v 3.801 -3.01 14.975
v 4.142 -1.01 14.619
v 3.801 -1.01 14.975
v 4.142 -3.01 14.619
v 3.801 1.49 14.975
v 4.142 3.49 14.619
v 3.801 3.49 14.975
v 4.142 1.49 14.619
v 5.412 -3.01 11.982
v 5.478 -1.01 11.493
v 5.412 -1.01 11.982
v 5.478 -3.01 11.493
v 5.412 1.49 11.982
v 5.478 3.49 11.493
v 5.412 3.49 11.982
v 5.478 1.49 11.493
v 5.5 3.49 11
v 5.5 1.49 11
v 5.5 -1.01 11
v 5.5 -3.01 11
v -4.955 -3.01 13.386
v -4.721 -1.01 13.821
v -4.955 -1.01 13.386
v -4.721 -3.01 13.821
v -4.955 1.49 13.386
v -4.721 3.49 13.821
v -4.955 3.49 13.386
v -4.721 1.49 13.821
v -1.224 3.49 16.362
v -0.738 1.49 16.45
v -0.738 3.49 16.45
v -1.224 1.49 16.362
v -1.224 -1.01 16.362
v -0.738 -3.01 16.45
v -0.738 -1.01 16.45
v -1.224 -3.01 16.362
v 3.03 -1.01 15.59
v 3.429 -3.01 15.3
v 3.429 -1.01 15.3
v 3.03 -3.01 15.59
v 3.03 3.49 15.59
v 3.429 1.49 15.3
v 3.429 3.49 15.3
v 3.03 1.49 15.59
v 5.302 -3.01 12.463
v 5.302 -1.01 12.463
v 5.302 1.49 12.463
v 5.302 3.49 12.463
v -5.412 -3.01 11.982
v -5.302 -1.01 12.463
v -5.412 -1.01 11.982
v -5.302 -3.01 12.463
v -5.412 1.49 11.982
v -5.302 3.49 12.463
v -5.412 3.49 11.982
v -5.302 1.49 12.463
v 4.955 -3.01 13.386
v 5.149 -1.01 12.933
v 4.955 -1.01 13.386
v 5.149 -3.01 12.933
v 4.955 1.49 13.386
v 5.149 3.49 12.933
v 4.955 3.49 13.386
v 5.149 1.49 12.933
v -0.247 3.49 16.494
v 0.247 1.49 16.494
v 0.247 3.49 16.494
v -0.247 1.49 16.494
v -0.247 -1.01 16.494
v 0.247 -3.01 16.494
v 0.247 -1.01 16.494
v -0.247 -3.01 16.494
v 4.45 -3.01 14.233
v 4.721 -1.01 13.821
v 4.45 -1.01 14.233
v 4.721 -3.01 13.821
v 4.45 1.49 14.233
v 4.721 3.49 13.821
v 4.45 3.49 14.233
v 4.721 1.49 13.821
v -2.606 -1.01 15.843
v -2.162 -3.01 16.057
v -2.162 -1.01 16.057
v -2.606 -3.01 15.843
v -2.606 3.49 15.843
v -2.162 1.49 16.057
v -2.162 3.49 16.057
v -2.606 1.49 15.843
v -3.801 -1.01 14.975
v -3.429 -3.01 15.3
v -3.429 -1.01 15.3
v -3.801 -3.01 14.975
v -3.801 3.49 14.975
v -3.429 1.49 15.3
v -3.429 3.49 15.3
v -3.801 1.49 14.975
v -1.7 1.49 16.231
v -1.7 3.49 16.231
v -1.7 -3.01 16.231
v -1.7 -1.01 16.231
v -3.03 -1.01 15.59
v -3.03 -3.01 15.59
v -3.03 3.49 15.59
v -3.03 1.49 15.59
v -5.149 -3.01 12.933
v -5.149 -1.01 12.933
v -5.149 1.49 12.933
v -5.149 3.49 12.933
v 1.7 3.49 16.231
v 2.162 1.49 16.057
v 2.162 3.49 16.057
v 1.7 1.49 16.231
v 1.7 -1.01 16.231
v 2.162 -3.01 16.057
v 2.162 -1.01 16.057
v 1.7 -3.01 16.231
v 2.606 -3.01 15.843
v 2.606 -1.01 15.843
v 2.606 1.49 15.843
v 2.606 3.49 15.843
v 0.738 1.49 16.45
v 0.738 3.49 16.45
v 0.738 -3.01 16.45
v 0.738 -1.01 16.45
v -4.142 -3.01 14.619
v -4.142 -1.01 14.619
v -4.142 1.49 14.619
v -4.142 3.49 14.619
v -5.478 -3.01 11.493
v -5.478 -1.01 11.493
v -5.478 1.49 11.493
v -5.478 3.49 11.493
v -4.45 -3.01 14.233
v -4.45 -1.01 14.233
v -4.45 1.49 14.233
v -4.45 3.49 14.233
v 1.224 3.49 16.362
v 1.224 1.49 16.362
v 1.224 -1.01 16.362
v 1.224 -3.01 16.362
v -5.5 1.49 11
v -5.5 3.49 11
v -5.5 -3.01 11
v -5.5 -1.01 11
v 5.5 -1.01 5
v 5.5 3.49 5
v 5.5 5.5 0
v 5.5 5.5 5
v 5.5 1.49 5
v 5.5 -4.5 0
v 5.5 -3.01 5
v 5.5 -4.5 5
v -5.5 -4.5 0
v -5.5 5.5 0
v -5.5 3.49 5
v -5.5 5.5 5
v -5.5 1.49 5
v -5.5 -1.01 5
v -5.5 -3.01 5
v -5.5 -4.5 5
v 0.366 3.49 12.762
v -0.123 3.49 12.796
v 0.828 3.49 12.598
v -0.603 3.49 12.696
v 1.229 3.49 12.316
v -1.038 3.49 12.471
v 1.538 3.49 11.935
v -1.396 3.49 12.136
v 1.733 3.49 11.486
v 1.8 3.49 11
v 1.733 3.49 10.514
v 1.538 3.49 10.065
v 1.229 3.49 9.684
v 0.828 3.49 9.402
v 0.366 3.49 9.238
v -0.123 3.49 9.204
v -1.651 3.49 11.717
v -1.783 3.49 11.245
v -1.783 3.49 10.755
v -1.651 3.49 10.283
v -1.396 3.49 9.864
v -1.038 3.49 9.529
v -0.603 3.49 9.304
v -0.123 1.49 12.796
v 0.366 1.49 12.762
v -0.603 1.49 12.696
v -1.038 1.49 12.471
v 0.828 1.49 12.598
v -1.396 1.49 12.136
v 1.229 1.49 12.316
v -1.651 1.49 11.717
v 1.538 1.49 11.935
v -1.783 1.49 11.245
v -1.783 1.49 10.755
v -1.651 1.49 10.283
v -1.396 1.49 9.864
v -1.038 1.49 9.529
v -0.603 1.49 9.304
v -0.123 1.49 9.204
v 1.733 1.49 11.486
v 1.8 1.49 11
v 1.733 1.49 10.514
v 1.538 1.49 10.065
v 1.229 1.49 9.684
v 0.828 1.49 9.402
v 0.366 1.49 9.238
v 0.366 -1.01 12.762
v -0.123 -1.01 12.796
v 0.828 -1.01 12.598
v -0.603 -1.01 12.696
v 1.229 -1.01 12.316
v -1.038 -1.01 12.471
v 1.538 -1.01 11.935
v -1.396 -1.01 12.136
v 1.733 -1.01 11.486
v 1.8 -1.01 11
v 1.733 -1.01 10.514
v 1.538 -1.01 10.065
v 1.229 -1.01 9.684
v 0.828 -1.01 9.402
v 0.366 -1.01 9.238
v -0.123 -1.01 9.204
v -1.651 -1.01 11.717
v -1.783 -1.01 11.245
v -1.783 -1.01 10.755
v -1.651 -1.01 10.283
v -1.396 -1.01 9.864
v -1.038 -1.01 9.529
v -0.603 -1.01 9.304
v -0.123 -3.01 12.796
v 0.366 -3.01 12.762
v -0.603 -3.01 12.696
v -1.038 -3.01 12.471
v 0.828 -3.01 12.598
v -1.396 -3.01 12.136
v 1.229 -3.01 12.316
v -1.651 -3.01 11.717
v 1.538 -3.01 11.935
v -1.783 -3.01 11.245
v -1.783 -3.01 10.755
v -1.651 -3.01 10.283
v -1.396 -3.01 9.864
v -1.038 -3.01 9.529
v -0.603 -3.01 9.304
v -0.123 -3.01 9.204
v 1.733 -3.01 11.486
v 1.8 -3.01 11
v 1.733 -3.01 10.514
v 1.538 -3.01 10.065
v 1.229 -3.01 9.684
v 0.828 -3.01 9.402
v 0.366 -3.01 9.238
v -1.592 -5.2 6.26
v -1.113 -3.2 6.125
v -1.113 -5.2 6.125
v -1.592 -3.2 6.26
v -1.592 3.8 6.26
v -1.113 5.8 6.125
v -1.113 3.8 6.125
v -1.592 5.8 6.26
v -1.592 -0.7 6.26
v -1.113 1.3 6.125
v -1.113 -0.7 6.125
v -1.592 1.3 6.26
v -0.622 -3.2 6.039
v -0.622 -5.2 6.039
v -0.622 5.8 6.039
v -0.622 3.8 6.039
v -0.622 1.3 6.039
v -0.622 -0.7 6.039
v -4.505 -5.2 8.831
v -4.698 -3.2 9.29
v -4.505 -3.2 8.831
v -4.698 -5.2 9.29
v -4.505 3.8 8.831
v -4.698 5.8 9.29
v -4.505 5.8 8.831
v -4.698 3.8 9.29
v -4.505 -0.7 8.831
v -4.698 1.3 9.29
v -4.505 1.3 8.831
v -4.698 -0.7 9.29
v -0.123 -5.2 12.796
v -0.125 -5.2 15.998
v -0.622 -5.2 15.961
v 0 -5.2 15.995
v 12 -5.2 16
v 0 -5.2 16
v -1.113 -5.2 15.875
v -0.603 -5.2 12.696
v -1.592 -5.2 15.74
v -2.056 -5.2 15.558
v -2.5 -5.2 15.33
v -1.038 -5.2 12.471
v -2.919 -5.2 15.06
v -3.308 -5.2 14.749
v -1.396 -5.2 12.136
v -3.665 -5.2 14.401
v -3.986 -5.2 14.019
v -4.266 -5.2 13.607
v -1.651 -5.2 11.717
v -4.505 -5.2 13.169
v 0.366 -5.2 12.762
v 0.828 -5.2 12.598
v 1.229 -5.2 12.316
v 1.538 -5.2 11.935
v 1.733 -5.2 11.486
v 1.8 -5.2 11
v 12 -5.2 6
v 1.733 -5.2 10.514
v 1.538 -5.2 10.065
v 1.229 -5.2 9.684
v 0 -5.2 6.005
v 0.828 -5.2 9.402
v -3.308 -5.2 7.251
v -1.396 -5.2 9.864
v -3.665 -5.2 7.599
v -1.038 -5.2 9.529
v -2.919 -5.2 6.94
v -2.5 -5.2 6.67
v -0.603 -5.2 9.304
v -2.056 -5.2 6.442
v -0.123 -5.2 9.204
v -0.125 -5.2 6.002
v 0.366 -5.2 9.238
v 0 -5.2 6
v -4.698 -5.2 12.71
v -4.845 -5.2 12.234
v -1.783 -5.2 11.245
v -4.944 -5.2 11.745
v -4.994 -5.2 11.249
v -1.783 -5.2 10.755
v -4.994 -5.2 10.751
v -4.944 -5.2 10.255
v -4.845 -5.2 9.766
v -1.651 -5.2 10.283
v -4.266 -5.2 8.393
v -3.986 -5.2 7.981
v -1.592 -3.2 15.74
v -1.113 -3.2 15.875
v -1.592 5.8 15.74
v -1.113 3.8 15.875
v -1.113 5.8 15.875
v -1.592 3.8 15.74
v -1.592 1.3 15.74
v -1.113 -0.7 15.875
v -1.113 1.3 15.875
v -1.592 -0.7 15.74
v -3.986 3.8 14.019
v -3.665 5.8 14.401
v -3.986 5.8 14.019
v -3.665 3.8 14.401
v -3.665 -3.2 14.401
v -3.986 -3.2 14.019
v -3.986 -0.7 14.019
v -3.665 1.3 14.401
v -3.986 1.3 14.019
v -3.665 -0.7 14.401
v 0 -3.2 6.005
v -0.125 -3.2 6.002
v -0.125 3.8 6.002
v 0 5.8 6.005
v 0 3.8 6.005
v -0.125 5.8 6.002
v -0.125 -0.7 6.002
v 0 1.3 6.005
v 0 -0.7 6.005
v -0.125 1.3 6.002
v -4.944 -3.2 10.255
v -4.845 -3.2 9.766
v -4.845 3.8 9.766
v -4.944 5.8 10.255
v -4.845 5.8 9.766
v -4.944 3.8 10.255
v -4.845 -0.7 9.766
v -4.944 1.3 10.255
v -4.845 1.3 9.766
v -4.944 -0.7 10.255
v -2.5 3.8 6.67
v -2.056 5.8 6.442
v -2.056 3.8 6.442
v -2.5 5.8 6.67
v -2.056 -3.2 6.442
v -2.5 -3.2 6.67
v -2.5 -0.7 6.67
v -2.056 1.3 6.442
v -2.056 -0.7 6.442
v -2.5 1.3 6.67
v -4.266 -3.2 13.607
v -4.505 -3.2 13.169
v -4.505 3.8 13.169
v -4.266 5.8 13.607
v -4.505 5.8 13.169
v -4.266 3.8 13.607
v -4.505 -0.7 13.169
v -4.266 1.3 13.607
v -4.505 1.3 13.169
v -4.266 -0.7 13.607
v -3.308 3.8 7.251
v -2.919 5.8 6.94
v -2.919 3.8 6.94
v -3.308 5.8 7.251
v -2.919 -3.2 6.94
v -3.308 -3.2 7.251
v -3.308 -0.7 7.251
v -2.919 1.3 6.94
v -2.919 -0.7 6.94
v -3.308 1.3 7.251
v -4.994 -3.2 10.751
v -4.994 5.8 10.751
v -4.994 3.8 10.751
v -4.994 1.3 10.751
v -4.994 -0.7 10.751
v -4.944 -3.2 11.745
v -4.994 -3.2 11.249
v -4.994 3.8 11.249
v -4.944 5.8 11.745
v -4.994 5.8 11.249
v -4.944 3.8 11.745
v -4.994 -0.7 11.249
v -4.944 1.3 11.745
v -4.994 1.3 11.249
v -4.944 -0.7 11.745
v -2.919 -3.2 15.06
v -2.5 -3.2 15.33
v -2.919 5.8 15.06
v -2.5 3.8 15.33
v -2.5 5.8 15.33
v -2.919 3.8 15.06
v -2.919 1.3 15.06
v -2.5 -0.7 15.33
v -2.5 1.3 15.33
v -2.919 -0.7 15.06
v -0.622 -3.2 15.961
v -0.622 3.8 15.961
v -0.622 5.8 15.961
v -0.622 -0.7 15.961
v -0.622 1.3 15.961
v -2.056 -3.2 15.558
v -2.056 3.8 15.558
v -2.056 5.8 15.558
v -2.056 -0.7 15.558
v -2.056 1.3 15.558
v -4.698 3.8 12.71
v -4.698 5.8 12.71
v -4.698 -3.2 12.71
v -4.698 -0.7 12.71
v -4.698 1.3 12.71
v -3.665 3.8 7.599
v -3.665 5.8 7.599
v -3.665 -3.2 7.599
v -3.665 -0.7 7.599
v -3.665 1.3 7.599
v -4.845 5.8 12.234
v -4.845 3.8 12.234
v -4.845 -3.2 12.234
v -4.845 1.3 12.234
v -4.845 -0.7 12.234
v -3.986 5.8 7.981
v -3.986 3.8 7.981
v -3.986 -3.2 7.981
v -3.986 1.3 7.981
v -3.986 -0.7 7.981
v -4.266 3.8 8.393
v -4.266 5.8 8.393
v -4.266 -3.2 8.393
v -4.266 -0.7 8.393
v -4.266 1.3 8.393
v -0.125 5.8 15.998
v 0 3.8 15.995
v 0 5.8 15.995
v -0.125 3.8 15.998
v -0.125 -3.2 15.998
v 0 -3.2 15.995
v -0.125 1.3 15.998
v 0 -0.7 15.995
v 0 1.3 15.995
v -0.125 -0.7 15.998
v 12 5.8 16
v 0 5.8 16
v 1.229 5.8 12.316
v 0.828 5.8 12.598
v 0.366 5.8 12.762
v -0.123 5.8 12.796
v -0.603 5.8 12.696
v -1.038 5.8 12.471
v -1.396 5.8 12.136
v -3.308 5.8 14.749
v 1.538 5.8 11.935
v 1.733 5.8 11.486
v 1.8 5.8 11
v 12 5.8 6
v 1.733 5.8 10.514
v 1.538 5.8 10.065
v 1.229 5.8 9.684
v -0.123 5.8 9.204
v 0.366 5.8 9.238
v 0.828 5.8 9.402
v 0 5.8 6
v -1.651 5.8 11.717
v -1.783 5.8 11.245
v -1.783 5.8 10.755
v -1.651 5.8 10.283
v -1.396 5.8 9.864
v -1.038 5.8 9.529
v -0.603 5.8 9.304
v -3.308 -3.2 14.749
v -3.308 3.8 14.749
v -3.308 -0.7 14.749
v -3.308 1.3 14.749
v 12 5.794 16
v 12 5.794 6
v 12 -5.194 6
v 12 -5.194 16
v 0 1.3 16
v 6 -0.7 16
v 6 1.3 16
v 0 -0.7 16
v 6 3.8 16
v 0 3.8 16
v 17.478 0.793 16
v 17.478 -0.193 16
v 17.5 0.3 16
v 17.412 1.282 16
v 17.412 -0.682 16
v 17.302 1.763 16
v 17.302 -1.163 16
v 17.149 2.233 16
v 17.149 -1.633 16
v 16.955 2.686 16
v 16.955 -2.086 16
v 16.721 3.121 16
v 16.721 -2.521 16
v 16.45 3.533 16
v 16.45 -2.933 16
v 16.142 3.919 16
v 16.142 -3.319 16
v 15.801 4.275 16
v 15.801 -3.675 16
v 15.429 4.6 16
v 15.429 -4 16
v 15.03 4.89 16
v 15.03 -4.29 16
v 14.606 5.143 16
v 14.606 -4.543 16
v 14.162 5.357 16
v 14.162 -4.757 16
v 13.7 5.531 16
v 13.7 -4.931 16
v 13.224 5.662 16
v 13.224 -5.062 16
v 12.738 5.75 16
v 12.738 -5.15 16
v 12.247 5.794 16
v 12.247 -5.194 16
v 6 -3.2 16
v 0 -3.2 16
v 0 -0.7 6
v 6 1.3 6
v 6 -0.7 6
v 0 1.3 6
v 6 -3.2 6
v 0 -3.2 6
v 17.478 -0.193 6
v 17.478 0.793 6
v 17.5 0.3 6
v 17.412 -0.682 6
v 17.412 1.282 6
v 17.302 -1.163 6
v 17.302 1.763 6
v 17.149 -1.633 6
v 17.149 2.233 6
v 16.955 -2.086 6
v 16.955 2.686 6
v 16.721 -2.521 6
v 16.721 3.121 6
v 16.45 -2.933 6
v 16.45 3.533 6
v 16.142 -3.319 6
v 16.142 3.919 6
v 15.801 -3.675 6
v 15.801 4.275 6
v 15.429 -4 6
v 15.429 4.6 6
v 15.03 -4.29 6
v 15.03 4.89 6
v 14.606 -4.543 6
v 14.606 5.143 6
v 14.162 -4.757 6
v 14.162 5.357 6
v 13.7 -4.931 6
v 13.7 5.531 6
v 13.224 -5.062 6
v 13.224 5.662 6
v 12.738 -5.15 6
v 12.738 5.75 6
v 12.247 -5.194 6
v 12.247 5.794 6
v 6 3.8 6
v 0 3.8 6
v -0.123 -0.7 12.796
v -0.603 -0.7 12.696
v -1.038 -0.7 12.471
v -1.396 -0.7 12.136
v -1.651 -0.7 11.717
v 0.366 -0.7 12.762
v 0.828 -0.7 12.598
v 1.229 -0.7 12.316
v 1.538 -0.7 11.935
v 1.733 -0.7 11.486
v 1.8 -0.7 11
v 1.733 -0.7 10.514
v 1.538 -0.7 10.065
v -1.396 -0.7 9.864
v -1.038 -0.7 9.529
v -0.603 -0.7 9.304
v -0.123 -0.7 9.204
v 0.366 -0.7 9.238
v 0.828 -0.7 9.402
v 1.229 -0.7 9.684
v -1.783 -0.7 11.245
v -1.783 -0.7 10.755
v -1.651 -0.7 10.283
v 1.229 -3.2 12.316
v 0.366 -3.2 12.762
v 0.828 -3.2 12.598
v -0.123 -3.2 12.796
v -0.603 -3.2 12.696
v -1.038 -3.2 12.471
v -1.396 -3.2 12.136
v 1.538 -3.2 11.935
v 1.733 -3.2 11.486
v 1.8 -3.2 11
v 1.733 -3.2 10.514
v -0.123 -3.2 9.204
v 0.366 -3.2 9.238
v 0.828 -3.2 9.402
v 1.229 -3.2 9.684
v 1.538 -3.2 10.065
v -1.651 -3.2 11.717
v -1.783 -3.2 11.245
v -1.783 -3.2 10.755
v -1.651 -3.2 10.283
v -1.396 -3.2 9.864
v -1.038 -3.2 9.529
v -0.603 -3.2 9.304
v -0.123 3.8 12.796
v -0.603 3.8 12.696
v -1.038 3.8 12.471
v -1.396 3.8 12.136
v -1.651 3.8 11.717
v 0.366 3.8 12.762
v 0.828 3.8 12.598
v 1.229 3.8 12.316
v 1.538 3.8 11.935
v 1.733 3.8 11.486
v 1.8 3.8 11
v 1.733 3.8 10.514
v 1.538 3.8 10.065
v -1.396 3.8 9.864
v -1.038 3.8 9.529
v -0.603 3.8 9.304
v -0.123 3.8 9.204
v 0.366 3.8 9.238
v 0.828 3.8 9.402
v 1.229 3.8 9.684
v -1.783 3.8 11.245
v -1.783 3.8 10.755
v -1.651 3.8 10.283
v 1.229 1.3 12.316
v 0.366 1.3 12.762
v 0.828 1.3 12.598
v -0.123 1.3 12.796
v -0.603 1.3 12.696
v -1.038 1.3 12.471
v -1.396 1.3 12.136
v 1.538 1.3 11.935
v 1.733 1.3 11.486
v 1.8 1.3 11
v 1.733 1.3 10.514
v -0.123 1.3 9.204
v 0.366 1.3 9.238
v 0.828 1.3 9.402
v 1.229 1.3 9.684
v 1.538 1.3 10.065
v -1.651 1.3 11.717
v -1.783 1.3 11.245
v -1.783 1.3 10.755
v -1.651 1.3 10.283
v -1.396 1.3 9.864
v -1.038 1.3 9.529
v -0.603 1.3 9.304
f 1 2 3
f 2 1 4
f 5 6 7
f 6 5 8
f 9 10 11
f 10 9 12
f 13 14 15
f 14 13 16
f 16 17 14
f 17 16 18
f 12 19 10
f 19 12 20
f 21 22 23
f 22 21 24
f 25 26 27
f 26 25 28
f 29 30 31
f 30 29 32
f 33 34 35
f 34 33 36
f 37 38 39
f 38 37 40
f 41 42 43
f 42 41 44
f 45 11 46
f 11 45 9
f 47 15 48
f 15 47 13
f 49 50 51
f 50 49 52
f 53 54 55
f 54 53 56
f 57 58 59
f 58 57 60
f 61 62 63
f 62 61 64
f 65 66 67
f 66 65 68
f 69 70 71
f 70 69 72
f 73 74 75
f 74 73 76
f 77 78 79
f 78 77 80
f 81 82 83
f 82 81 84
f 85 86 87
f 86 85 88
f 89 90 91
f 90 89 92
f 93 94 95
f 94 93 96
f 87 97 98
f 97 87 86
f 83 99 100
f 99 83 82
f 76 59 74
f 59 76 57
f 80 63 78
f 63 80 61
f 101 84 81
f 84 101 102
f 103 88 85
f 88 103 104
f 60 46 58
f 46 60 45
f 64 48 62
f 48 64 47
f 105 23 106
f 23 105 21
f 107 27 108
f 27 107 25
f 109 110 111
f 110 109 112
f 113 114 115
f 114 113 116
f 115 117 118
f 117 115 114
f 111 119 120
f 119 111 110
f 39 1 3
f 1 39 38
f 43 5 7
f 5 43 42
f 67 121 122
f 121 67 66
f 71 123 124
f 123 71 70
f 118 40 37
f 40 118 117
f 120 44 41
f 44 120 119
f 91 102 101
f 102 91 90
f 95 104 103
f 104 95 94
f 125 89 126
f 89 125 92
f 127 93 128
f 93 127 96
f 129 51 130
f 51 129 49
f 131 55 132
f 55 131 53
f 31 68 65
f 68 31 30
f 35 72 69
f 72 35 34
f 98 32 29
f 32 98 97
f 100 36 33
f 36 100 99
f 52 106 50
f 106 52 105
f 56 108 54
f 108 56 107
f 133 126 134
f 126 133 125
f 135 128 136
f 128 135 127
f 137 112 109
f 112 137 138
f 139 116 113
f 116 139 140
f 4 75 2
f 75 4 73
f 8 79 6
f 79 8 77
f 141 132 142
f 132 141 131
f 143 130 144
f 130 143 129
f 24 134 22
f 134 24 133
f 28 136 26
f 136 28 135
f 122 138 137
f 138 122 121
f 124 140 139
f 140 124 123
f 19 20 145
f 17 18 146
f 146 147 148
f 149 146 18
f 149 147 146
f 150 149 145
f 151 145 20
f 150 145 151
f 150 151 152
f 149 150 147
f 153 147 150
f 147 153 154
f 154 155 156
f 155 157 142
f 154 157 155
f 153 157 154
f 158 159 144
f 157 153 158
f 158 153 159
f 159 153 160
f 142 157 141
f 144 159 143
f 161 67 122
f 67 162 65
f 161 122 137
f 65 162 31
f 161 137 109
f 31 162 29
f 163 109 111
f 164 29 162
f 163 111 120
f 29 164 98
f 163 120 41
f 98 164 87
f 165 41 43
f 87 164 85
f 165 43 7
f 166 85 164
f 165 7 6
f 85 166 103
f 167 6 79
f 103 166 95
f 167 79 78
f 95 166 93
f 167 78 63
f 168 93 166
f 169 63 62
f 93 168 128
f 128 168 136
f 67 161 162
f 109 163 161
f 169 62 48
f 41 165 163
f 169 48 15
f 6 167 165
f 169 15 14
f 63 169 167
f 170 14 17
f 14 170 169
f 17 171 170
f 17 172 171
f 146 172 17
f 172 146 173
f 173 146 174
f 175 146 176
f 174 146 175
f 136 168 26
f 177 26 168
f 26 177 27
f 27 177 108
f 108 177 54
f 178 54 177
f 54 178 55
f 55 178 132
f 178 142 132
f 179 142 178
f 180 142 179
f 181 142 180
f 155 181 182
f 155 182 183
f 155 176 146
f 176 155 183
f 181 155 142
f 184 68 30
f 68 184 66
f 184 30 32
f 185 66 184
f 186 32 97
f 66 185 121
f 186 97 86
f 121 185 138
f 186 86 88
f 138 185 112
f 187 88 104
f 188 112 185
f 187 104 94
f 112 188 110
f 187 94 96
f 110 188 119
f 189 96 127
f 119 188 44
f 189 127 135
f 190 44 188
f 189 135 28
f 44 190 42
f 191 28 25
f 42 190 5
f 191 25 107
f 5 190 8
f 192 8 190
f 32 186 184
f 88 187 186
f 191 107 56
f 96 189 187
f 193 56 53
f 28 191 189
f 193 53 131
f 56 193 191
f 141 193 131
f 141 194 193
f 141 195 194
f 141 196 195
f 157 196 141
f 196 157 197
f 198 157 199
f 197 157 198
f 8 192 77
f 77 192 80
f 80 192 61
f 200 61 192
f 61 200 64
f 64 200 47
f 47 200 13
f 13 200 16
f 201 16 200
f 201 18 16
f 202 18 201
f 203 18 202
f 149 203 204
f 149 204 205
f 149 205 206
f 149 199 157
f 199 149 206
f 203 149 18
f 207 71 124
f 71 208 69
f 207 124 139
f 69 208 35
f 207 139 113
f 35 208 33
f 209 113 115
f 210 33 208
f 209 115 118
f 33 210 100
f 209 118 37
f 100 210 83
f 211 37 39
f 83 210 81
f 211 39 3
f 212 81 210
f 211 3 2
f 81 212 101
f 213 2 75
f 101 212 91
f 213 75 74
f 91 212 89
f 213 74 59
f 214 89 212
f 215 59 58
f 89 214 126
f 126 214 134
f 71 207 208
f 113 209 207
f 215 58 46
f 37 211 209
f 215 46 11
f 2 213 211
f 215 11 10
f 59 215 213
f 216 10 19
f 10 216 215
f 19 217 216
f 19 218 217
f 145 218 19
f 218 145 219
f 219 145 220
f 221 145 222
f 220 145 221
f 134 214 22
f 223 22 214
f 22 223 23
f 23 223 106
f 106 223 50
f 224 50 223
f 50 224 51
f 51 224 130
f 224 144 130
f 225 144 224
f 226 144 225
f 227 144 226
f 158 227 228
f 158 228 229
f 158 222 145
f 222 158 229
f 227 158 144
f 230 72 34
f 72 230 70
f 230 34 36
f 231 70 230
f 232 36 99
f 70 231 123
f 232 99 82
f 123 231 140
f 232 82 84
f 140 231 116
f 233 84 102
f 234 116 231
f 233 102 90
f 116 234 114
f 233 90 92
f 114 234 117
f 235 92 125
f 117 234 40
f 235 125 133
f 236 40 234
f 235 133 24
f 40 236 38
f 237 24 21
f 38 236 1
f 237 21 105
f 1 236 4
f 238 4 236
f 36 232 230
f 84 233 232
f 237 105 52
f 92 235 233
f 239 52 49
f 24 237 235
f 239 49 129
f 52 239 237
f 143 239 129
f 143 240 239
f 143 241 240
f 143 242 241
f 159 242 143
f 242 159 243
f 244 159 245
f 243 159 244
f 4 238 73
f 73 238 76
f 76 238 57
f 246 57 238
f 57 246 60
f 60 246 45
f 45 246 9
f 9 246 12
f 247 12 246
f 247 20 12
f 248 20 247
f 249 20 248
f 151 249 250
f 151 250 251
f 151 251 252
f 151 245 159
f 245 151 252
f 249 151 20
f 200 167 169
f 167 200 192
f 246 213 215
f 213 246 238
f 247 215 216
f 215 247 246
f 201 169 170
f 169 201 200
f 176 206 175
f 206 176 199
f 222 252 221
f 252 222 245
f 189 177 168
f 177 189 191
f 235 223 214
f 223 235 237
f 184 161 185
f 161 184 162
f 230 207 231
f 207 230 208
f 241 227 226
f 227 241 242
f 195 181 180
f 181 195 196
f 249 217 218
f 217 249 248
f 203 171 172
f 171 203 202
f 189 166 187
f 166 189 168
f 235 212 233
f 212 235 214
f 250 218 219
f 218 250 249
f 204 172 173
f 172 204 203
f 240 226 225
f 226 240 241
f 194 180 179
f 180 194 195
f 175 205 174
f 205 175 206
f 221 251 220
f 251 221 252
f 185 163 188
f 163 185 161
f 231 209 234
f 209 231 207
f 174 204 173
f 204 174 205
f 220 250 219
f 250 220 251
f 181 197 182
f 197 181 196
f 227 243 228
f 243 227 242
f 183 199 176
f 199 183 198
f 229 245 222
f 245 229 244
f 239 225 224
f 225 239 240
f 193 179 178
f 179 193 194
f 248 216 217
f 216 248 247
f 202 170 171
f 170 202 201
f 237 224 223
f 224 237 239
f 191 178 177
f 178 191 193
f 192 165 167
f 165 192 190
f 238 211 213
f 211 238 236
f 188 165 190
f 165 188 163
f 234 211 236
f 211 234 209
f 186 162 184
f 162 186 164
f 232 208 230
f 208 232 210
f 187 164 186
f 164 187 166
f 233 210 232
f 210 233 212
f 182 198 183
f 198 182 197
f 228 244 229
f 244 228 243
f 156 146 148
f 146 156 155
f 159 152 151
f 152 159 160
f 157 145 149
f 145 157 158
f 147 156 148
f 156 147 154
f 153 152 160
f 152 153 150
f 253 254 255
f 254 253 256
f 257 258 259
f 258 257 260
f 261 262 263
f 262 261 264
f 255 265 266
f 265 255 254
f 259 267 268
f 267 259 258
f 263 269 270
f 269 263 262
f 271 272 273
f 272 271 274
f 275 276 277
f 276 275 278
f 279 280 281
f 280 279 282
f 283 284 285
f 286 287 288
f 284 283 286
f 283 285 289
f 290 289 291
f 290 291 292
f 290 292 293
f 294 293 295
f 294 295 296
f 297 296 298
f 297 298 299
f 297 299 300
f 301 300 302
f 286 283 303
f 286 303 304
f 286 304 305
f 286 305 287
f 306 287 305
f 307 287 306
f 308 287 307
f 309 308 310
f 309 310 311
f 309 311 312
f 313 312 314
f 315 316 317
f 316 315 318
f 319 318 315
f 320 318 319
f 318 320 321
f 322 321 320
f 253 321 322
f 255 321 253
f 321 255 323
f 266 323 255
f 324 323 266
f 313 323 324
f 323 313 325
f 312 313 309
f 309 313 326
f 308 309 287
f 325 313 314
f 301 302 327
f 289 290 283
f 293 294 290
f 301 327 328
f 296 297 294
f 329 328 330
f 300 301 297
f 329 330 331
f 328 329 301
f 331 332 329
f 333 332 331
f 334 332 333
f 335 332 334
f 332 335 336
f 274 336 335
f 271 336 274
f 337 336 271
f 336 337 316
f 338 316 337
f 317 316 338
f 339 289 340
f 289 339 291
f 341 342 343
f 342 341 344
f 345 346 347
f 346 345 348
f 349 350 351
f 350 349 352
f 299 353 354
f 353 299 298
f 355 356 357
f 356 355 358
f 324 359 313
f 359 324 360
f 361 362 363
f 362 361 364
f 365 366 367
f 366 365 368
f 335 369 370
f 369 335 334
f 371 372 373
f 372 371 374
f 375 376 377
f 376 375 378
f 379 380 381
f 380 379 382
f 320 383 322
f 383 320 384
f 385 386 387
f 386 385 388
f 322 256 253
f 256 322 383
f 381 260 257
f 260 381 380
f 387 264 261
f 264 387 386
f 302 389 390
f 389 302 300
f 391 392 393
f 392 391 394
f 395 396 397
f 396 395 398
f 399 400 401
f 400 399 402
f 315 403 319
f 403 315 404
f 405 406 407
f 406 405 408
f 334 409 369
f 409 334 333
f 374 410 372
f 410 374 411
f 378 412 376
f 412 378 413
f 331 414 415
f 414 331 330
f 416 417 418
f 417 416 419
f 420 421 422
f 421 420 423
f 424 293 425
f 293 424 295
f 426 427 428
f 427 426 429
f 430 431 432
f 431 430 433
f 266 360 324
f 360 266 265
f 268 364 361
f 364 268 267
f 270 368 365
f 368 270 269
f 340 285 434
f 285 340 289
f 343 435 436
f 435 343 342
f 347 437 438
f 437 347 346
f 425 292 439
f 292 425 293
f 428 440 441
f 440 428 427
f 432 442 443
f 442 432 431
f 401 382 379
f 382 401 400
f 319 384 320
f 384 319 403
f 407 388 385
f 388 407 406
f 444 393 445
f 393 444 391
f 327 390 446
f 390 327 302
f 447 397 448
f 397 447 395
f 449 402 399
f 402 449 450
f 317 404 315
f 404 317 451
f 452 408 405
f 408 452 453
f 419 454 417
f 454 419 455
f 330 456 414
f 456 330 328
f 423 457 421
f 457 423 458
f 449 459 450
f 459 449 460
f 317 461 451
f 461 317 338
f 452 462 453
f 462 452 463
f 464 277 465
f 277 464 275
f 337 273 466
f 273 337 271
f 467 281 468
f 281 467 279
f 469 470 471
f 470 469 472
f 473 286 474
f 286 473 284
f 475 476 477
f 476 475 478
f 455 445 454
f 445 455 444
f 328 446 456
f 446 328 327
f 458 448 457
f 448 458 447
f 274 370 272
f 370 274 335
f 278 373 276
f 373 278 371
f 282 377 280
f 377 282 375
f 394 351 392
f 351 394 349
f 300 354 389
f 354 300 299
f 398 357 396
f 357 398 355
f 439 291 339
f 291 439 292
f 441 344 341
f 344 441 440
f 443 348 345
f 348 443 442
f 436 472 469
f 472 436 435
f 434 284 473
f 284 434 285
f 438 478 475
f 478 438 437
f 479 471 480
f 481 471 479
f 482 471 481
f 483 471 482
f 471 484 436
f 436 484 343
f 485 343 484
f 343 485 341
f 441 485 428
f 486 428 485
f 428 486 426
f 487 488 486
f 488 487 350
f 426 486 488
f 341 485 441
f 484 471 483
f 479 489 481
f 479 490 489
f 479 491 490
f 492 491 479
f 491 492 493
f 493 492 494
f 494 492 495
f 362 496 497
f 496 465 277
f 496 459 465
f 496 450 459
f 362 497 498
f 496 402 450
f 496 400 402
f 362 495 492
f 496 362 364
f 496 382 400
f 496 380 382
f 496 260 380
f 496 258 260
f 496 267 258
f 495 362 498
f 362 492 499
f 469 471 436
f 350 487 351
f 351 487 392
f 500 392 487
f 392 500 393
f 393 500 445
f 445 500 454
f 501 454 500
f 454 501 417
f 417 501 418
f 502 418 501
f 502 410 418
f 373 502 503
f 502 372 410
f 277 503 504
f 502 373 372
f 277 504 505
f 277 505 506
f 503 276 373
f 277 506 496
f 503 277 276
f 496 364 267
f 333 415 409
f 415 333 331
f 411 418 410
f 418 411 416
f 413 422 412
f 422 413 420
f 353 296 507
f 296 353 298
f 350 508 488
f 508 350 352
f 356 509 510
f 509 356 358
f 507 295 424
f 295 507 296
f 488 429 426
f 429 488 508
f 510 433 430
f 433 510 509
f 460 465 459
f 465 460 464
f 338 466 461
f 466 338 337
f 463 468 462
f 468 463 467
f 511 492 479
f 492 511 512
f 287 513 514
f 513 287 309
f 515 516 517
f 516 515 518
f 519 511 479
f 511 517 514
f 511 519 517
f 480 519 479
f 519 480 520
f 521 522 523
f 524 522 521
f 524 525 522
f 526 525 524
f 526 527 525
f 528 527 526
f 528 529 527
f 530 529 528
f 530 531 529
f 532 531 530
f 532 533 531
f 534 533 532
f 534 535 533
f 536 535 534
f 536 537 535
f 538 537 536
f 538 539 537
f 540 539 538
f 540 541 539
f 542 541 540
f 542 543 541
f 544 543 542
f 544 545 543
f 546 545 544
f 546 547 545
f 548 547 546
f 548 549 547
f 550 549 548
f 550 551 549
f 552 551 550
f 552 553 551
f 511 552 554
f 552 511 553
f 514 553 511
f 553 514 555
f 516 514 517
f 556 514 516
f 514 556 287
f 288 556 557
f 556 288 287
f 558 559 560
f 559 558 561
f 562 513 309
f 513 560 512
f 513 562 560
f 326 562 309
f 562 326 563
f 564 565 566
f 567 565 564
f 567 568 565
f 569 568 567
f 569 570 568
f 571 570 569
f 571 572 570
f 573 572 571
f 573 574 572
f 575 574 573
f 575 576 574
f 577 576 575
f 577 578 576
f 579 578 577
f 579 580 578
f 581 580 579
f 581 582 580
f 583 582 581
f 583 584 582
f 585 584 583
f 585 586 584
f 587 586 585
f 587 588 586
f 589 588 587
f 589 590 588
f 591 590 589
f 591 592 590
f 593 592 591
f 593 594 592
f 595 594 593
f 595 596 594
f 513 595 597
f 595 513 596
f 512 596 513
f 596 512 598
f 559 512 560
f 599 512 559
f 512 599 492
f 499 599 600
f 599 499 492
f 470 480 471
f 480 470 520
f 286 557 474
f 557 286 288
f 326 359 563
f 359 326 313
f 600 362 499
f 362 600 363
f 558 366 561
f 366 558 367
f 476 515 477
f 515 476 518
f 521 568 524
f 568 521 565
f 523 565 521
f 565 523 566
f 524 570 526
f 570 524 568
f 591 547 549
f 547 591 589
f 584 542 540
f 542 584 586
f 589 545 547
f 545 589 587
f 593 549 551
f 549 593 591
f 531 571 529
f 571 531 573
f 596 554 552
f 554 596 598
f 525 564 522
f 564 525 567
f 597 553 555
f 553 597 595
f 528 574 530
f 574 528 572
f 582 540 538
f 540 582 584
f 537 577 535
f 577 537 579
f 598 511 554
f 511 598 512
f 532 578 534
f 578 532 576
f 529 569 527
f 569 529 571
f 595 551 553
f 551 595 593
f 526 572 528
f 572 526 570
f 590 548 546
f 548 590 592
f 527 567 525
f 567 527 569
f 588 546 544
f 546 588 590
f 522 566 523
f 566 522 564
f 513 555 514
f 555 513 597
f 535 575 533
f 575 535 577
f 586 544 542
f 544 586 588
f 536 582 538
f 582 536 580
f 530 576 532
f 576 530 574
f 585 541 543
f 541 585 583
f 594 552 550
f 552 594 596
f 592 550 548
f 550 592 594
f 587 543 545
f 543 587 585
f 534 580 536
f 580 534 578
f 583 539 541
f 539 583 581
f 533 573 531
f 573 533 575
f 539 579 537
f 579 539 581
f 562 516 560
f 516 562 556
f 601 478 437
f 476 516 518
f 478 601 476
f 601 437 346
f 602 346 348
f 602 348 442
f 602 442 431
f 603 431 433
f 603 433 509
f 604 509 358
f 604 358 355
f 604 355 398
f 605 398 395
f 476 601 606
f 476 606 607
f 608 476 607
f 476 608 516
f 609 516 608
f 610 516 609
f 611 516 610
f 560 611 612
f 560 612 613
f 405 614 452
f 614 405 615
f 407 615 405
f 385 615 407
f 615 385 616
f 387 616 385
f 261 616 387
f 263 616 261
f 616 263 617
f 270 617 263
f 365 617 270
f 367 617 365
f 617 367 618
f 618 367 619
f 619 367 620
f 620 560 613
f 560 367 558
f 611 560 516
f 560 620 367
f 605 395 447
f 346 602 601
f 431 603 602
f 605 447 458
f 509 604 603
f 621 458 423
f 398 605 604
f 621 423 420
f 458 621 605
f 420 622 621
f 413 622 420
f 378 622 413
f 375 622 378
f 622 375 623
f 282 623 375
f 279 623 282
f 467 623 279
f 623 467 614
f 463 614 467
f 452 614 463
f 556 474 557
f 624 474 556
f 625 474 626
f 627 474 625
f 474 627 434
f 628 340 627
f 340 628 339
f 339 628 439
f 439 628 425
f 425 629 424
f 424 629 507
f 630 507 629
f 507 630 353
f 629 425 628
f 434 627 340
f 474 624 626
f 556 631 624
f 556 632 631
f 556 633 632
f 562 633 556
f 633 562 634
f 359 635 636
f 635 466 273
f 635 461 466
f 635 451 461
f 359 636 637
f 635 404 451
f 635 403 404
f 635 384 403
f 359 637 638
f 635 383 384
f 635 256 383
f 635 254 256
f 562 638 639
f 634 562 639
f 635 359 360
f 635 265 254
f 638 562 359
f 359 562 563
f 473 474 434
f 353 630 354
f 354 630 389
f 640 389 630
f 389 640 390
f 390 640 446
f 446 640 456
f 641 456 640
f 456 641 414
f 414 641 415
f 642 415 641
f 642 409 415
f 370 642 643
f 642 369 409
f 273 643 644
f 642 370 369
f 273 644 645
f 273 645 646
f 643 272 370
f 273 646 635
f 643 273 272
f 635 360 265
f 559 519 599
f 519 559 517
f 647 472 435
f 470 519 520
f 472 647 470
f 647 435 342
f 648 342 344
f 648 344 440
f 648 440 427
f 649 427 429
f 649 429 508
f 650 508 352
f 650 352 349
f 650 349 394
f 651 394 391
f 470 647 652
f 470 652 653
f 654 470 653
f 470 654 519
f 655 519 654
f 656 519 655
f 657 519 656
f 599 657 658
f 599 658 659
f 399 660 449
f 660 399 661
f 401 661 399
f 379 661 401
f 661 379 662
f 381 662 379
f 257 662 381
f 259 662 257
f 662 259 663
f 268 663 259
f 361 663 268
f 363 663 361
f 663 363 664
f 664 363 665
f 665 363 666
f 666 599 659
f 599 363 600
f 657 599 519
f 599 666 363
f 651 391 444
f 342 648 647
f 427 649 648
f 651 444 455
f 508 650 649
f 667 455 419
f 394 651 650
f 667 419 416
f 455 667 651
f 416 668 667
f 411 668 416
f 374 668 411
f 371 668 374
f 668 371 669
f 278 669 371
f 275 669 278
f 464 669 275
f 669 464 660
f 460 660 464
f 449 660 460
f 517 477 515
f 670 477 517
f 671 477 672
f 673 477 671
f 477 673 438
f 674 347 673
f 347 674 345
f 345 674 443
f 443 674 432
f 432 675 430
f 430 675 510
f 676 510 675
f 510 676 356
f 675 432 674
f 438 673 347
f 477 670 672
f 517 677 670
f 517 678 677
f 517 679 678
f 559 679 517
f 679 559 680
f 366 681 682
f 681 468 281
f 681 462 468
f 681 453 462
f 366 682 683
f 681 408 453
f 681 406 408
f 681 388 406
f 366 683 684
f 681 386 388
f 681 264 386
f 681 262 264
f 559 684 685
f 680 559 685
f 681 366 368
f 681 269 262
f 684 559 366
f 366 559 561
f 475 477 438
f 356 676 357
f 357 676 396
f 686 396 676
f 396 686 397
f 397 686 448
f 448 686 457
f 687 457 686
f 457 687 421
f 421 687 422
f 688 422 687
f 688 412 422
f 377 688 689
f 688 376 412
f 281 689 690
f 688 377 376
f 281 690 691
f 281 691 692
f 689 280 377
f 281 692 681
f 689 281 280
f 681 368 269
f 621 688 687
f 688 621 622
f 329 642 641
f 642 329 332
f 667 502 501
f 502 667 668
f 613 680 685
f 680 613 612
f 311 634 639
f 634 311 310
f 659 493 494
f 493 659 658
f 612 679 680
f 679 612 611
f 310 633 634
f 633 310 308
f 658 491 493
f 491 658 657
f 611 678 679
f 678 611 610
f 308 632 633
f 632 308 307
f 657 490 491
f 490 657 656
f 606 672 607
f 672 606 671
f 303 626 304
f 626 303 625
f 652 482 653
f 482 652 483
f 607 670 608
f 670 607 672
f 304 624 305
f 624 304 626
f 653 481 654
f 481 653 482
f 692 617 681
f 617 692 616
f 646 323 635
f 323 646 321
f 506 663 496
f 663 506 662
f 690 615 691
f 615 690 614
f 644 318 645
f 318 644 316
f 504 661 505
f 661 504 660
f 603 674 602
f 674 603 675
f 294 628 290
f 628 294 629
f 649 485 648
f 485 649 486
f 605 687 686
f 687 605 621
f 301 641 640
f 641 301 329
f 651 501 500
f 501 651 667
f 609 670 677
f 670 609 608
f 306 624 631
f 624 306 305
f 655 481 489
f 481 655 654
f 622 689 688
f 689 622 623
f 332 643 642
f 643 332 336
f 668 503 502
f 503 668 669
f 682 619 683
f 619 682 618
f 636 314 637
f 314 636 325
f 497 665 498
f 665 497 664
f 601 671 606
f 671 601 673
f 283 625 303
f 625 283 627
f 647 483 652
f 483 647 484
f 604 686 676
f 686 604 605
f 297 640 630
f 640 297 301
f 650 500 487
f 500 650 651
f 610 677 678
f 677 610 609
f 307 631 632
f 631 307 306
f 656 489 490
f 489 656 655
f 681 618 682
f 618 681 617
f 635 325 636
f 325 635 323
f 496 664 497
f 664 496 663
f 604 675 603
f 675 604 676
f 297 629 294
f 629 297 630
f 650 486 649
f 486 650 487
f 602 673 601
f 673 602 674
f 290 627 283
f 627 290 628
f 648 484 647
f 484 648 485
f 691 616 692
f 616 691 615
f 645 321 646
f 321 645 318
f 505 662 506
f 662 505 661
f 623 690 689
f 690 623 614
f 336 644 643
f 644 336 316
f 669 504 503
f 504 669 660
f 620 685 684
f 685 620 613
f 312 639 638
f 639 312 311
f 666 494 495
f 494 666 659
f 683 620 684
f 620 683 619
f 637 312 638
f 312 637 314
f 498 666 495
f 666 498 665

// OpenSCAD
$fa=1;
$fs=0.5;

//basic modules
//##############
module  hole (d,h) {
  cylinder (d=d,h=h) ;
}

module M3hole (h) {
  hole (3.6,h);
}



module connector2x (cWidth,cHeight,gap) {
  module outerShape() {
    union () {
      translate ([0,0,cWidth]) {
        rotate ([90,0,0]) {
          cylinder (d=cWidth,h=cHeight) ;
        }
      }
      translate ([-cWidth/2,-cHeight,0]) {
        cube  ([cWidth,cHeight,cWidth]) ;
      }
    }
  }

  module base ()  {
    translate ([-cWidth/2,-cHeight,0]) {
    cube ([cWidth,cHeight,cWidth/2-0.5]);
    }
  }

  module connectorGaps() {
    union () {
      for ( i = [0:2+gap:cHeight] ) {
        translate ([-cWidth/2-1,-2-i-0.01,-0.1]) {
          cube ([cWidth+2,gap,cHeight*2]);
        }
      }
    }
  }
  module boltHole() {
    translate ([0,1,cWidth]) {
      rotate ([90,0,0]) {
        M3hole(cHeight+2) ;
      }
    }
  }

  translate ([0,cWidth/2,0]){
  union () {
    base () ;
    difference () {
      union () {
        outerShape () ;
      }
      union () {
        boltHole();
        connectorGaps() ;
      }
    }
  }
  }
}

module connector3x (cHeight,cWidth,gap) {
    module outerShape () {
      //roundedEnd
      translate ([0,0,cWidth/2]) {
        rotate ([-90,0,0]) {
          cylinder (d=cWidth, h=cHeight) ;
        }
      }
      //connection
      cube ([cWidth+2,cHeight,cWidth]) ;
      //connection round
      translate ([cWidth+2,cHeight/2,0]){
        cylinder (d=cHeight,h=cWidth);
      }

    }
    module connectorGaps () {
      //connectorSlits
      for ( i = [0:2+gap:5] ) {
        translate ([-cWidth/2,2+i,-1]){
          cube ([cWidth+1,gap,cWidth+2]);
        }
      }

    }
    module screwHoles () {
      //screwhole
      translate ([0,-1,cWidth/2]) {
        rotate ([-90,0,0]){
          M3hole (cHeight+2);
        }
      }
    }
  
  translate ([0,-cWidth/2-.2,-cWidth/2+cHeight]) {
    difference () {
      union () {
        outerShape ();
      }

      union () {
        connectorGaps();
        screwHoles() ;
      }
    }
  }
}

color ("lime",0.5) {
  connector2x (11,10,2.5);
}

color ("orange",0.5) {
  connector3x (11,10,2.5);
}
